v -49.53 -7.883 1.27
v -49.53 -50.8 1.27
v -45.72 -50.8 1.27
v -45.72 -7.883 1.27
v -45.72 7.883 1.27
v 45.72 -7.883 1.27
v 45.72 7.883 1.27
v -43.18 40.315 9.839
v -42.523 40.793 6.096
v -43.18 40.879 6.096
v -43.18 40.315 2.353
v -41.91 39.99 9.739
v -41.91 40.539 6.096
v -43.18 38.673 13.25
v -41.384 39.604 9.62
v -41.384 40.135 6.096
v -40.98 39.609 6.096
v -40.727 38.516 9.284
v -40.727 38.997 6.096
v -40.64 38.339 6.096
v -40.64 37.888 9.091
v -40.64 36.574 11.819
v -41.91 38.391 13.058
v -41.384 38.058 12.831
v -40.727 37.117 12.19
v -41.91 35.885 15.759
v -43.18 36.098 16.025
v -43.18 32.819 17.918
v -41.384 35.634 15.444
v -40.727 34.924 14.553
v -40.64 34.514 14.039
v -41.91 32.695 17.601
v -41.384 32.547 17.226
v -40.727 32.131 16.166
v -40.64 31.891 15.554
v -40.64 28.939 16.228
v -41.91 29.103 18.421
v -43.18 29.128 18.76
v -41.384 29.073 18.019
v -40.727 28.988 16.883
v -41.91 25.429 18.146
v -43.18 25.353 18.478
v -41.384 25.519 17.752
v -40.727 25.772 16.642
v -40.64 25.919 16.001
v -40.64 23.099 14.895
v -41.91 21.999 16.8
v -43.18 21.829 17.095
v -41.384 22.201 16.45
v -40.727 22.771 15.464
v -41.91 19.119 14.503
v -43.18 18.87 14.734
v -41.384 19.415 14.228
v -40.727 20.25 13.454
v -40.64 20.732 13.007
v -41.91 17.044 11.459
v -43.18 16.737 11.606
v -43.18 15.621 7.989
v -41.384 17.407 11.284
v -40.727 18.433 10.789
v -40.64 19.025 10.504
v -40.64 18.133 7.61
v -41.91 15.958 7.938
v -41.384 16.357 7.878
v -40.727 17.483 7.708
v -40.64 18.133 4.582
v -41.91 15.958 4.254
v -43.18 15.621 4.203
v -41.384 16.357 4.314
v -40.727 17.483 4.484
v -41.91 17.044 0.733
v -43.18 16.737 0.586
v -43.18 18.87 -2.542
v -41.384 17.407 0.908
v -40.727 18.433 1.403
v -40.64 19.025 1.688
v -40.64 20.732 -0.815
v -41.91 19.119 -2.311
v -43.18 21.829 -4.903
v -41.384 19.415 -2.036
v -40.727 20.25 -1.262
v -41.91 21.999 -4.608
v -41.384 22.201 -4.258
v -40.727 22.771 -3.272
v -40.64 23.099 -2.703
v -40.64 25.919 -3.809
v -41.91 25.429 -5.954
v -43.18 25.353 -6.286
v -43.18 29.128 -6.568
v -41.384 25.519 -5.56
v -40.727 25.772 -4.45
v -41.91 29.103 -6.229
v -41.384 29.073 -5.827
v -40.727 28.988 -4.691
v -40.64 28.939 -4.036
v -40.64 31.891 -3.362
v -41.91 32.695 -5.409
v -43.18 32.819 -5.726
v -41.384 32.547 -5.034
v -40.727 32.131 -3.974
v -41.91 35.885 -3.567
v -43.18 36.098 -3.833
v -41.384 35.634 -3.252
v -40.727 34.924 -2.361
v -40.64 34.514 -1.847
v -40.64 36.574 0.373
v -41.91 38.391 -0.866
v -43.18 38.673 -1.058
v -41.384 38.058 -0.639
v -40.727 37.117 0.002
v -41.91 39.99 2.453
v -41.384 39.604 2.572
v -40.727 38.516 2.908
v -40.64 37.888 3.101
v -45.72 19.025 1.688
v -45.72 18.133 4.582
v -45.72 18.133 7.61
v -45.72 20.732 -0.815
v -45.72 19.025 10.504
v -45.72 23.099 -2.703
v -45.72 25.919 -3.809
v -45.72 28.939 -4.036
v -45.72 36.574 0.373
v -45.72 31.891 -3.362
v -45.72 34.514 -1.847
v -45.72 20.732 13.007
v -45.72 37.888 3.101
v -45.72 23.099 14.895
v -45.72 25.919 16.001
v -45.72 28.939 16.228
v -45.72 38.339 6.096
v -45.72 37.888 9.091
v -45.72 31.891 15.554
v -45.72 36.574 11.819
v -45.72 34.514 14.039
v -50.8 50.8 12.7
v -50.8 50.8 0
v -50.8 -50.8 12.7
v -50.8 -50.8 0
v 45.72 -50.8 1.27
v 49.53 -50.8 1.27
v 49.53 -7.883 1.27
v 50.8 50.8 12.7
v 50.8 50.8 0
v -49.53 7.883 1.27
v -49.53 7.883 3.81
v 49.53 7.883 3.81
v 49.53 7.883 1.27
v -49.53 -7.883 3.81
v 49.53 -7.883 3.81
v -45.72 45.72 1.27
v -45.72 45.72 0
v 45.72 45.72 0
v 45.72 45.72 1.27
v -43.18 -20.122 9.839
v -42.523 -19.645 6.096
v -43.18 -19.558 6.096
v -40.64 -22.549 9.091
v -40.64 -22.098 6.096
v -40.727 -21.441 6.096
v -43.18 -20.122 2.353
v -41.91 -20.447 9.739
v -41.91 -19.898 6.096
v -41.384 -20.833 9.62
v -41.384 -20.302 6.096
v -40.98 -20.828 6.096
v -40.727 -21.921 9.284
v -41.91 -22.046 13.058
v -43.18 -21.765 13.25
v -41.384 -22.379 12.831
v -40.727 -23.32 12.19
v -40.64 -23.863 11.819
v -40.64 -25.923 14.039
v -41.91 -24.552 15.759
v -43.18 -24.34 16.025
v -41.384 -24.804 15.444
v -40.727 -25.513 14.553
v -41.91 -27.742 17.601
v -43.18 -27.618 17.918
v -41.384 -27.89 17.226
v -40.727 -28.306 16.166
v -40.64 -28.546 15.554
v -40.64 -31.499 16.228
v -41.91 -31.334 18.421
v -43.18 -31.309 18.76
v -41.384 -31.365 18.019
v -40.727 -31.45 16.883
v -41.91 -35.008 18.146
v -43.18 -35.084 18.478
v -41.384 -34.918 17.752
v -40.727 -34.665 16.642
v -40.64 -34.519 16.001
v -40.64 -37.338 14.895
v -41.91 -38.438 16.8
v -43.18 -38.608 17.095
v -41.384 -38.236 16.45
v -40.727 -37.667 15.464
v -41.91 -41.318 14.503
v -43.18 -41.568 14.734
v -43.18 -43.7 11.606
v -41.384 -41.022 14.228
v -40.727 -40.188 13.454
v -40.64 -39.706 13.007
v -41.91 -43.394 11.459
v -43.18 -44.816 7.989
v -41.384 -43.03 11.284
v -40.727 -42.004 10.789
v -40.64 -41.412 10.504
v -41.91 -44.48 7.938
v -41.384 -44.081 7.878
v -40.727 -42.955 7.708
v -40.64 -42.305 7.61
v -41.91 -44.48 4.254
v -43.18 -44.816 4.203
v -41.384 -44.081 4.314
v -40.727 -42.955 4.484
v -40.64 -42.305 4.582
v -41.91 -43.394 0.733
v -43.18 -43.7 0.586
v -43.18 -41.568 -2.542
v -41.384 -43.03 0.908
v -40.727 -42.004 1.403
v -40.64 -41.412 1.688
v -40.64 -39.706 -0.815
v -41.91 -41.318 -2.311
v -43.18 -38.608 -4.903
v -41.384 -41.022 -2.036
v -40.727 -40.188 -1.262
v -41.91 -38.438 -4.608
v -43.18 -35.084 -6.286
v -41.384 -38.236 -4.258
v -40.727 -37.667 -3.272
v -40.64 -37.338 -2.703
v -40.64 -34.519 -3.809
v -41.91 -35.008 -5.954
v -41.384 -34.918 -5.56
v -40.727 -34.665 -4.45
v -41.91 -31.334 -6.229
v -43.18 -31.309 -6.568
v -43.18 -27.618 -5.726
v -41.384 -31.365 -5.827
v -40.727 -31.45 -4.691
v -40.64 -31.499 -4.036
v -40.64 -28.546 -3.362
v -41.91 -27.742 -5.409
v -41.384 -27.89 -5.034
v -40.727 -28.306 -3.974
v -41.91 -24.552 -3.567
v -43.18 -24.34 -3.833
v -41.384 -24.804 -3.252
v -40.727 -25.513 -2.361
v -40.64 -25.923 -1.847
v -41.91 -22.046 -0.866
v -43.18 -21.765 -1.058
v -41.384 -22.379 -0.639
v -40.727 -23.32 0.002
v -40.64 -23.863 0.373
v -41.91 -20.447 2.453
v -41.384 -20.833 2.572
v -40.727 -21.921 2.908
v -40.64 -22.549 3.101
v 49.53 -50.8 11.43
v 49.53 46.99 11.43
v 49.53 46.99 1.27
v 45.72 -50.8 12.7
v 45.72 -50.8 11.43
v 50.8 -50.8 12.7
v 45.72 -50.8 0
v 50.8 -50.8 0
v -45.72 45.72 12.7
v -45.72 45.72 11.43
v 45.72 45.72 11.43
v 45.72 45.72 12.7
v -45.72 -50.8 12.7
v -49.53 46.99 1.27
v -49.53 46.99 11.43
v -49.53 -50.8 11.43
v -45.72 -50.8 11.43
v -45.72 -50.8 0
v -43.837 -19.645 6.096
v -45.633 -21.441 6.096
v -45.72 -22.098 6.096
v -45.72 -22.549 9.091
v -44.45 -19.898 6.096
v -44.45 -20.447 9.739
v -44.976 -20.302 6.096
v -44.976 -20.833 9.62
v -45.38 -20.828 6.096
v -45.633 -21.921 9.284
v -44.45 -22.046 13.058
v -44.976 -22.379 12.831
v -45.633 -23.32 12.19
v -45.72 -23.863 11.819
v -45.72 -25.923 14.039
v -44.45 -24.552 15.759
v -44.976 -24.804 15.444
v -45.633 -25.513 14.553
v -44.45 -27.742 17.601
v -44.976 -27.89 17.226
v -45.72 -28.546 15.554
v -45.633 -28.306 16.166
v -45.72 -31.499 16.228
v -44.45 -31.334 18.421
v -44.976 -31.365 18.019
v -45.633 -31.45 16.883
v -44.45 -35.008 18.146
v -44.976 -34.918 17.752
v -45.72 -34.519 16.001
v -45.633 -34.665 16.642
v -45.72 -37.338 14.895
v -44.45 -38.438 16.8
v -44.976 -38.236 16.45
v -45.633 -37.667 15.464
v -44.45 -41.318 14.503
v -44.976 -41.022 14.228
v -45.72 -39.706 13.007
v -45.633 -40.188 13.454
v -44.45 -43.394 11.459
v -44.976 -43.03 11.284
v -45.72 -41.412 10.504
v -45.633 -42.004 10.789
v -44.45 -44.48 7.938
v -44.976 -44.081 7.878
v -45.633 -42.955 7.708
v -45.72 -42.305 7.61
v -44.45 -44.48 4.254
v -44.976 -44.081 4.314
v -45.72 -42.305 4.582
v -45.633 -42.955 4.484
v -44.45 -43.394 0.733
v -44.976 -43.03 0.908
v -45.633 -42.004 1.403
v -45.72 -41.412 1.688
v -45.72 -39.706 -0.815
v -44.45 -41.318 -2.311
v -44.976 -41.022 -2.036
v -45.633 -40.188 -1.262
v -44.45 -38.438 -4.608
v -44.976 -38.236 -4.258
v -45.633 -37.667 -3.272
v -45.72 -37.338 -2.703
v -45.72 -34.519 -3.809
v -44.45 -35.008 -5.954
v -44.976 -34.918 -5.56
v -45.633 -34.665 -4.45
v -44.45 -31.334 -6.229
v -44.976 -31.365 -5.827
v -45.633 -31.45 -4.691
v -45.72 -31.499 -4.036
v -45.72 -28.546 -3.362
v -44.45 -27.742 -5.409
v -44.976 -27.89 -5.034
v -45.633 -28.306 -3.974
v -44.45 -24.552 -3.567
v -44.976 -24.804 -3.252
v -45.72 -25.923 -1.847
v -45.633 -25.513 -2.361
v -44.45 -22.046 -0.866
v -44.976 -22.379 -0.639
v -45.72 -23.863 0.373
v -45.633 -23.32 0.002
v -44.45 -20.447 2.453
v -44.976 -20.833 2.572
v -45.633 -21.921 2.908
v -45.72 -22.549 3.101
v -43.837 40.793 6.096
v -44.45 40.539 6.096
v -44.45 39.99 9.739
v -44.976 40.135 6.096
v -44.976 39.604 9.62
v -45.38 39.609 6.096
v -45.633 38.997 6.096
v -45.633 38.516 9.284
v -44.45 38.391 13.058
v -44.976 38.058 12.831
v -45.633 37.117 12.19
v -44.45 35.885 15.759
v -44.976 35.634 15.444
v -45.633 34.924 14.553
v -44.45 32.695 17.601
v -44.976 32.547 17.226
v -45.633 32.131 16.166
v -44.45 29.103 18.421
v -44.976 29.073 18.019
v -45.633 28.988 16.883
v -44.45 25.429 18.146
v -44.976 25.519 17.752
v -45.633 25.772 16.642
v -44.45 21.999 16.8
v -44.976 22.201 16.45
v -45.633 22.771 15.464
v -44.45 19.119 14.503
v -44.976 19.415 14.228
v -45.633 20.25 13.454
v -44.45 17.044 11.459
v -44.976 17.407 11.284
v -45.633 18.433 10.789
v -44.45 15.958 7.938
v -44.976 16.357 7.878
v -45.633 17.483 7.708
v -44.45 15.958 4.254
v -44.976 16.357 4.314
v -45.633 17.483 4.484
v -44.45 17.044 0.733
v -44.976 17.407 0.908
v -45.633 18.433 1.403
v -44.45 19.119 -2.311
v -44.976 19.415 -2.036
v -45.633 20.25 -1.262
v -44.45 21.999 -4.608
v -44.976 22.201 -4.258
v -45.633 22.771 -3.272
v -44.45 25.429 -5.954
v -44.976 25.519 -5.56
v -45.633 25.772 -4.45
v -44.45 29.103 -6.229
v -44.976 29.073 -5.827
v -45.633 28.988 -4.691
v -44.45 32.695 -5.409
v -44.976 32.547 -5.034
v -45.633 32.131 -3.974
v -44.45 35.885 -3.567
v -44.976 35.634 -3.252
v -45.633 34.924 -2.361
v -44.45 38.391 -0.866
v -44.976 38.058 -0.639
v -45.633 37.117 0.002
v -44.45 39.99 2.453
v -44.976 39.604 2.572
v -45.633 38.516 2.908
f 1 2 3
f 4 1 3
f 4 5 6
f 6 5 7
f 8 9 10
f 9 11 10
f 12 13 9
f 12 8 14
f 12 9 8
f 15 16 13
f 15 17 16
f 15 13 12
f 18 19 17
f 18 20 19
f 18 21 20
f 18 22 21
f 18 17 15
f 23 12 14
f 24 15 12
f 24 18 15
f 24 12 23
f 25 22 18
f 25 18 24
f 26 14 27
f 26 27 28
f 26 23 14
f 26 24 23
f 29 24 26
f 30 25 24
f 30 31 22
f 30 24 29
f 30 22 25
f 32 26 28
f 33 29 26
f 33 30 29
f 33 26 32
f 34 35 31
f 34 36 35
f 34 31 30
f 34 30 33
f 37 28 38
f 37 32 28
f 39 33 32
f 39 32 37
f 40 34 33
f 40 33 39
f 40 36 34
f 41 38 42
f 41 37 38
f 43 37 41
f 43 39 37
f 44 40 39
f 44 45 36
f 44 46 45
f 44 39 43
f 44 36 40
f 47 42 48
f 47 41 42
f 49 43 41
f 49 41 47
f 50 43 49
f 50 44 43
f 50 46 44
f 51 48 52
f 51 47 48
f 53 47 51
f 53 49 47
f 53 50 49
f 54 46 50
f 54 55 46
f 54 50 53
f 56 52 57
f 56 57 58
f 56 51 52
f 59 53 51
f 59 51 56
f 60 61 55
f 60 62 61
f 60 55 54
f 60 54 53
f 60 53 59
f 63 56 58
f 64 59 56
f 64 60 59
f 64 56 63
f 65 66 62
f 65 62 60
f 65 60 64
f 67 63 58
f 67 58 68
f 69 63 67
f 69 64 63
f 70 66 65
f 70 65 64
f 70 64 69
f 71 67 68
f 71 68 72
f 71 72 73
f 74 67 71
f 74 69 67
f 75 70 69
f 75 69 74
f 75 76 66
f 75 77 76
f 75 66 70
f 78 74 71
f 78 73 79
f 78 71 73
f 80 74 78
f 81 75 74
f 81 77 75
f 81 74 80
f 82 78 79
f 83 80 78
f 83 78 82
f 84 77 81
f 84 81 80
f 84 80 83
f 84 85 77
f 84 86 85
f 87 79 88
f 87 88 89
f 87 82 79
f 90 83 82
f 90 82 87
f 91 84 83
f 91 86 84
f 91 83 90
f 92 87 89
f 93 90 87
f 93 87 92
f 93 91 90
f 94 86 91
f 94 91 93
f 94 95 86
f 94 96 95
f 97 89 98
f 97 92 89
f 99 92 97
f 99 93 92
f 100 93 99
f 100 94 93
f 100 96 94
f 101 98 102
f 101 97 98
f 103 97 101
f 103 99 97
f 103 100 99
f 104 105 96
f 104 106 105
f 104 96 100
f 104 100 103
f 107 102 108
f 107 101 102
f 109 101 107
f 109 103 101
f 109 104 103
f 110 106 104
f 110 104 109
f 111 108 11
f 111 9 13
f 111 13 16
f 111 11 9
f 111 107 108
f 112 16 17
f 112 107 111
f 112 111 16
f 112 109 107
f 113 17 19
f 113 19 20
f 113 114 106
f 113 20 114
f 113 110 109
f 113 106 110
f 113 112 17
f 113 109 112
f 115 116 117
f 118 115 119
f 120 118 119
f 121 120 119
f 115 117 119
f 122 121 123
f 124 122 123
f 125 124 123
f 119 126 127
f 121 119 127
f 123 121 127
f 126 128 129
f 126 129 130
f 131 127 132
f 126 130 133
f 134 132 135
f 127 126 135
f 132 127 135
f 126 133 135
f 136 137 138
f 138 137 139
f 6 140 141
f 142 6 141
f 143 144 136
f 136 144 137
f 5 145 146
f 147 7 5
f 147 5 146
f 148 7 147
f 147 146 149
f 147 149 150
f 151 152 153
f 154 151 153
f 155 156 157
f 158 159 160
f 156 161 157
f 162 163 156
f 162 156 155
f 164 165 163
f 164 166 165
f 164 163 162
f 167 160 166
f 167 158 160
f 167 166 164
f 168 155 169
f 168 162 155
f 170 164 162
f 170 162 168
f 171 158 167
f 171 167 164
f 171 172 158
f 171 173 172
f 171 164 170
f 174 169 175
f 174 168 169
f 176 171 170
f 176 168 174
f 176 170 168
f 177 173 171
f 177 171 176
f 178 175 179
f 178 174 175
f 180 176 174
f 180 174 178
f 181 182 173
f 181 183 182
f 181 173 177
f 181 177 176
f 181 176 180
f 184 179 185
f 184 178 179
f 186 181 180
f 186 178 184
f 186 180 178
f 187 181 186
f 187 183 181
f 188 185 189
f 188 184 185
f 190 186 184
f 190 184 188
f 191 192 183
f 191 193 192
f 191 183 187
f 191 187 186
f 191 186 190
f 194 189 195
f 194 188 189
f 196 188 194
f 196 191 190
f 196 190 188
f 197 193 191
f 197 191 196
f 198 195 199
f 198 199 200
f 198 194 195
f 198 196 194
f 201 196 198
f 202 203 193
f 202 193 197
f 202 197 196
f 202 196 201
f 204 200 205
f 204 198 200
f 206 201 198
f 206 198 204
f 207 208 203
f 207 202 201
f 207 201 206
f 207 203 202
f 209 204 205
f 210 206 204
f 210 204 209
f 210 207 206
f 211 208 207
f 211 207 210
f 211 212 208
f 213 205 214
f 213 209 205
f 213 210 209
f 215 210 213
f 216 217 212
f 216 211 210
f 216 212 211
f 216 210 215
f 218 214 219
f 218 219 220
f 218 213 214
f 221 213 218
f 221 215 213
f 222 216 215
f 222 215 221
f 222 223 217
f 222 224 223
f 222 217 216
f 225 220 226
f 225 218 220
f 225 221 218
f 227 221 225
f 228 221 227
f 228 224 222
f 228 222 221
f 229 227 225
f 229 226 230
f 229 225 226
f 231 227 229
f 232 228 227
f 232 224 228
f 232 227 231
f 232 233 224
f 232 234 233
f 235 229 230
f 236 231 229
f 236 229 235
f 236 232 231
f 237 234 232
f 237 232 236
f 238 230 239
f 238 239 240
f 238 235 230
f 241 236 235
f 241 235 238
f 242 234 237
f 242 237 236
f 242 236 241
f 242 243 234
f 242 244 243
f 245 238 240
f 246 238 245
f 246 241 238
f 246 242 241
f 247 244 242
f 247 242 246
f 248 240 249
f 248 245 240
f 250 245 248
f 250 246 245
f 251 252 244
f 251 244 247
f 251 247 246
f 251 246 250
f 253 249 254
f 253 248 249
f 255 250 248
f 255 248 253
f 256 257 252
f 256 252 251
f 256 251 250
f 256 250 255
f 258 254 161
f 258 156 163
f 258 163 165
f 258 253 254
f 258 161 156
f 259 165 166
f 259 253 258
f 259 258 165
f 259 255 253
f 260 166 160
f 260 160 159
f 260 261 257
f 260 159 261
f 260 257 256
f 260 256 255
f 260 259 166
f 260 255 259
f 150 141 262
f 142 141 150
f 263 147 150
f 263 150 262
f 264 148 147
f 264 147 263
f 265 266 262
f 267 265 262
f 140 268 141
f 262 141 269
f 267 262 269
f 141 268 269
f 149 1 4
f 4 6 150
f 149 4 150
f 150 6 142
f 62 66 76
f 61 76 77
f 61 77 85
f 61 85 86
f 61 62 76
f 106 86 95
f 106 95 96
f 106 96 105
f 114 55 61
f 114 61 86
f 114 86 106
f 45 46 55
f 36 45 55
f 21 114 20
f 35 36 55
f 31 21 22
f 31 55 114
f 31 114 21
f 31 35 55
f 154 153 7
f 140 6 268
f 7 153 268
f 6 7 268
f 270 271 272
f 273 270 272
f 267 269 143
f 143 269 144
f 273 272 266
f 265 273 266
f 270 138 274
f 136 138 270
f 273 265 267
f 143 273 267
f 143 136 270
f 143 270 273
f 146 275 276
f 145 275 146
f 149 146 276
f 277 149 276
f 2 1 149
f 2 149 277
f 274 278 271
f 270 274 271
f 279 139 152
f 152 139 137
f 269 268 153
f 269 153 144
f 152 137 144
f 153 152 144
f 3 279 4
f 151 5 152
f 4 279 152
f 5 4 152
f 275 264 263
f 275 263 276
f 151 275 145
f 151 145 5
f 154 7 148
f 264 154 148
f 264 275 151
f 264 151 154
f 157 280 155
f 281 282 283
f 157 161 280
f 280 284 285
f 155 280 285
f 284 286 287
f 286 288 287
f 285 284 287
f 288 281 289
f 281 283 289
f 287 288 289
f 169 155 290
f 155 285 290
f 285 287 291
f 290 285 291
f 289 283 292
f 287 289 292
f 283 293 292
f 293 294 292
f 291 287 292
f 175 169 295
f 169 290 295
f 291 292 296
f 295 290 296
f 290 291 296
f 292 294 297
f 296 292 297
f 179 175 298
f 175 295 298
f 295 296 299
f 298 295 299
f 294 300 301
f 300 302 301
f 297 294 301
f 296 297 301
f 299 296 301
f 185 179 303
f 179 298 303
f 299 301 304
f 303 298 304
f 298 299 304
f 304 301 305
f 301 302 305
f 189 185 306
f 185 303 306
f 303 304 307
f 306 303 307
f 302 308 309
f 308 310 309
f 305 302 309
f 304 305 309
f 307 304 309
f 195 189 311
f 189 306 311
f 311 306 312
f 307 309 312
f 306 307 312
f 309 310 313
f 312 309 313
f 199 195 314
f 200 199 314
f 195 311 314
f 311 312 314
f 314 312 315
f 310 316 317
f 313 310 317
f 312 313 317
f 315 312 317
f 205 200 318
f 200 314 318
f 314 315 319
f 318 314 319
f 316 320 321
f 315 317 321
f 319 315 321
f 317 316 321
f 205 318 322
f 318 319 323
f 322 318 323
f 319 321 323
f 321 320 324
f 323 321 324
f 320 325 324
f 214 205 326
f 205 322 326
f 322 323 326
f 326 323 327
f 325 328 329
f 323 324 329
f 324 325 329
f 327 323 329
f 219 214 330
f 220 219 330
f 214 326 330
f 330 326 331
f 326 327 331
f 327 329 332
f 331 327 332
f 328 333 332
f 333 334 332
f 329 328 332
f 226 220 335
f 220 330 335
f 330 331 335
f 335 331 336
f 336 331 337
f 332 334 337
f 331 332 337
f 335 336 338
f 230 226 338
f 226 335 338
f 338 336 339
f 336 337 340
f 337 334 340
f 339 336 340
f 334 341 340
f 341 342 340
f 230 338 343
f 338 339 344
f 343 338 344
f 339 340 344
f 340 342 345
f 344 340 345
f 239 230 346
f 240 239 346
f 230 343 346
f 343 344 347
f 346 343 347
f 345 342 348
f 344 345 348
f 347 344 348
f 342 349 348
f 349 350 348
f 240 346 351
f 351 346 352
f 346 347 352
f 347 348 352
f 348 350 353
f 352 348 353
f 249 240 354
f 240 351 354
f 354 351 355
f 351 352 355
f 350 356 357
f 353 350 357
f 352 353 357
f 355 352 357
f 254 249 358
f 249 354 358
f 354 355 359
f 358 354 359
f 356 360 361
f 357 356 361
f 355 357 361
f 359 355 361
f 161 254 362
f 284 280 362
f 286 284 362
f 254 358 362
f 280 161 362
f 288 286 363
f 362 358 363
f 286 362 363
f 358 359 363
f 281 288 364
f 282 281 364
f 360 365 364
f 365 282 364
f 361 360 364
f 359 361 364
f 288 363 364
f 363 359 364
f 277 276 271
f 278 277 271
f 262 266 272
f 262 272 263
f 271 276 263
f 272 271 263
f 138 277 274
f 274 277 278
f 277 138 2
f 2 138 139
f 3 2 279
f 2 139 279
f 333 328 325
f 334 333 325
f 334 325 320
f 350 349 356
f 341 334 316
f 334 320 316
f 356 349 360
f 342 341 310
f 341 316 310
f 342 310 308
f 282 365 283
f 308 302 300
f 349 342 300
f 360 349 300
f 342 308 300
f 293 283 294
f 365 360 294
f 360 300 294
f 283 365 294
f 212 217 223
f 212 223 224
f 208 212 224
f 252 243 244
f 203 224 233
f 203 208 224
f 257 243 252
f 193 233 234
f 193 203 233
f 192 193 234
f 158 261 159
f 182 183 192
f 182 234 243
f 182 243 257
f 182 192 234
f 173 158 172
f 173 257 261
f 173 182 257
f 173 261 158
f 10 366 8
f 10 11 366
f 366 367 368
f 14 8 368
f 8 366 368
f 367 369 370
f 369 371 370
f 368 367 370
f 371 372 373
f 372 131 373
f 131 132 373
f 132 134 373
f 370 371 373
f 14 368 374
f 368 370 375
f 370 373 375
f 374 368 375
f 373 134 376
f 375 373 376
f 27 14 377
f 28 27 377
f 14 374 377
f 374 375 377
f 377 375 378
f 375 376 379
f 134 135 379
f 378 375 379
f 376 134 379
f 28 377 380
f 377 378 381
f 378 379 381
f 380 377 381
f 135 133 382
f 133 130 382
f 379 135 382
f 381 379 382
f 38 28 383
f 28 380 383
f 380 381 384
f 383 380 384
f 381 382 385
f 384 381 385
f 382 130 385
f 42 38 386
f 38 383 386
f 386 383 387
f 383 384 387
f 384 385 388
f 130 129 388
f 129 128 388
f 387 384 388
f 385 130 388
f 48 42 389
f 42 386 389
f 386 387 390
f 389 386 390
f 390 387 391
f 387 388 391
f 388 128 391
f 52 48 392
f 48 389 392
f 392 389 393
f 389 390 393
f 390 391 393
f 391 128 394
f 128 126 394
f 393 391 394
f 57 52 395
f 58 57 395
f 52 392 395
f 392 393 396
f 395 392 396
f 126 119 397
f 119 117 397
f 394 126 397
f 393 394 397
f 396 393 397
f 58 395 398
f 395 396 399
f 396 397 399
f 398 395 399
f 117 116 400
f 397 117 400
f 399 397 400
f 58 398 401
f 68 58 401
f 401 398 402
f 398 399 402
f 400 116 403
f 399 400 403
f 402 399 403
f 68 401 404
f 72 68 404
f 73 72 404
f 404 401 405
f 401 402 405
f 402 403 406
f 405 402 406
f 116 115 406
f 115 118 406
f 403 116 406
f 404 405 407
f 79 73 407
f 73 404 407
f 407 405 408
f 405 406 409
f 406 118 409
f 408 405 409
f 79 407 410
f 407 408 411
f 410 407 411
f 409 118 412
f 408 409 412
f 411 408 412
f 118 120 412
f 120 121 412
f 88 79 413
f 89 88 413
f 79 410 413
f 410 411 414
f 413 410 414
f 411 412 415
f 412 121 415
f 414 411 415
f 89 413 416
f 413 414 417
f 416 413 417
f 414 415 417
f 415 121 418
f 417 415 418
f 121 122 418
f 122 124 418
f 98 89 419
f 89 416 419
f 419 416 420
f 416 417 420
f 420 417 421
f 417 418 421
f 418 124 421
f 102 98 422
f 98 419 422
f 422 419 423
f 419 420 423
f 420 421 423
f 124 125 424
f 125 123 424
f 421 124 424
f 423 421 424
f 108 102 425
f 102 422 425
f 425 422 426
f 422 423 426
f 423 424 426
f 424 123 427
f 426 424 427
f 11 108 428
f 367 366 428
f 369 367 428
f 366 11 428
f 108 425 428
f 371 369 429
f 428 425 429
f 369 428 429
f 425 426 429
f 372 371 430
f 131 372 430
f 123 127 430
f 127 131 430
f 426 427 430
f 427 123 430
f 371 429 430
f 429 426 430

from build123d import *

# Parameters (mm, degrees)
F1_DEPTH  = 12.7
F3_R      = 12.7
F4_DEPTH  = 5.08
F5_R      = 2.53999
F5_2_R    = 2.53999
F8_DEPTH  = 10.16
F9_W      = 99.06
F9_H      = 15.766306633
F10_DEPTH = 2.54


# Not quite as in the source:
# - a fillet or chamfer is up to 0.001 mm smaller than in the source, because OpenCascade refuses the exact size


with BuildPart() as f1:
    # F0 (on Top) → F1 (new body)
    with BuildSketch(Plane.XY):
        Polygon((50.8, -50.8), (50.8, 50.8), (-50.8, 50.8), (-50.8, -50.8), (-45.72, -50.8), (-45.72, -45.72), (-45.72, 45.72), (45.72, 45.72), (45.72, -45.72), (45.72, -50.8), align=None)
    extrude(amount=F1_DEPTH)

    # F7 (on offset) → F8 (cut)
    with BuildSketch(Plane.XY.offset(1.27)):
        Polygon((49.53, 46.99), (-49.53, 46.99), (-49.53, -46.99), (-49.53, -61.8615858257), (49.53, -61.8615858257), (49.53, -46.99), align=None)
    extrude(amount=F8_DEPTH, mode=Mode.SUBTRACT)

    # F9 (on offset) → F10 (join)
    with BuildSketch(Plane.XY.offset(1.27)):
        Rectangle(F9_W, F9_H)
    extrude(amount=F10_DEPTH)


with BuildPart() as f4:
    # F3 (on offset) → F4 (new body)
    with BuildSketch(Plane.YZ.offset(-45.72)):
        with Locations((-32.2580002248, 6.0960003175)):
            Circle(F3_R)
    extrude(amount=F4_DEPTH)

    # F5 (radius 2.54 in the source; OpenCascade refuses exactly that, so slightly less here)
    f5_edges = [f4.edges().sort_by_distance(p)[0] for p in [
        (-40.64, -44.958, 6.096),
        (-45.72, -44.958, 6.096),
    ]]
    fillet(f5_edges, radius=F5_R)


with BuildPart() as f4b:
    # F3 (on offset) → F4, piece 2 (new body)
    with BuildSketch(Plane.YZ.offset(-45.72)):
        with Locations((28.1793344766, 6.0960003175)):
            Circle(F3_R)
    extrude(amount=F4_DEPTH)

    # F5#2 (radius 2.54 in the source; OpenCascade refuses exactly that, so slightly less here)
    f5_2_edges = [f4b.edges().sort_by_distance(p)[0] for p in [
        (-45.72, 15.479334, 6.096),
        (-40.64, 15.479334, 6.096),
    ]]
    fillet(f5_2_edges, radius=F5_2_R)


solid = Compound([f1.part, f4.part, f4b.part])
